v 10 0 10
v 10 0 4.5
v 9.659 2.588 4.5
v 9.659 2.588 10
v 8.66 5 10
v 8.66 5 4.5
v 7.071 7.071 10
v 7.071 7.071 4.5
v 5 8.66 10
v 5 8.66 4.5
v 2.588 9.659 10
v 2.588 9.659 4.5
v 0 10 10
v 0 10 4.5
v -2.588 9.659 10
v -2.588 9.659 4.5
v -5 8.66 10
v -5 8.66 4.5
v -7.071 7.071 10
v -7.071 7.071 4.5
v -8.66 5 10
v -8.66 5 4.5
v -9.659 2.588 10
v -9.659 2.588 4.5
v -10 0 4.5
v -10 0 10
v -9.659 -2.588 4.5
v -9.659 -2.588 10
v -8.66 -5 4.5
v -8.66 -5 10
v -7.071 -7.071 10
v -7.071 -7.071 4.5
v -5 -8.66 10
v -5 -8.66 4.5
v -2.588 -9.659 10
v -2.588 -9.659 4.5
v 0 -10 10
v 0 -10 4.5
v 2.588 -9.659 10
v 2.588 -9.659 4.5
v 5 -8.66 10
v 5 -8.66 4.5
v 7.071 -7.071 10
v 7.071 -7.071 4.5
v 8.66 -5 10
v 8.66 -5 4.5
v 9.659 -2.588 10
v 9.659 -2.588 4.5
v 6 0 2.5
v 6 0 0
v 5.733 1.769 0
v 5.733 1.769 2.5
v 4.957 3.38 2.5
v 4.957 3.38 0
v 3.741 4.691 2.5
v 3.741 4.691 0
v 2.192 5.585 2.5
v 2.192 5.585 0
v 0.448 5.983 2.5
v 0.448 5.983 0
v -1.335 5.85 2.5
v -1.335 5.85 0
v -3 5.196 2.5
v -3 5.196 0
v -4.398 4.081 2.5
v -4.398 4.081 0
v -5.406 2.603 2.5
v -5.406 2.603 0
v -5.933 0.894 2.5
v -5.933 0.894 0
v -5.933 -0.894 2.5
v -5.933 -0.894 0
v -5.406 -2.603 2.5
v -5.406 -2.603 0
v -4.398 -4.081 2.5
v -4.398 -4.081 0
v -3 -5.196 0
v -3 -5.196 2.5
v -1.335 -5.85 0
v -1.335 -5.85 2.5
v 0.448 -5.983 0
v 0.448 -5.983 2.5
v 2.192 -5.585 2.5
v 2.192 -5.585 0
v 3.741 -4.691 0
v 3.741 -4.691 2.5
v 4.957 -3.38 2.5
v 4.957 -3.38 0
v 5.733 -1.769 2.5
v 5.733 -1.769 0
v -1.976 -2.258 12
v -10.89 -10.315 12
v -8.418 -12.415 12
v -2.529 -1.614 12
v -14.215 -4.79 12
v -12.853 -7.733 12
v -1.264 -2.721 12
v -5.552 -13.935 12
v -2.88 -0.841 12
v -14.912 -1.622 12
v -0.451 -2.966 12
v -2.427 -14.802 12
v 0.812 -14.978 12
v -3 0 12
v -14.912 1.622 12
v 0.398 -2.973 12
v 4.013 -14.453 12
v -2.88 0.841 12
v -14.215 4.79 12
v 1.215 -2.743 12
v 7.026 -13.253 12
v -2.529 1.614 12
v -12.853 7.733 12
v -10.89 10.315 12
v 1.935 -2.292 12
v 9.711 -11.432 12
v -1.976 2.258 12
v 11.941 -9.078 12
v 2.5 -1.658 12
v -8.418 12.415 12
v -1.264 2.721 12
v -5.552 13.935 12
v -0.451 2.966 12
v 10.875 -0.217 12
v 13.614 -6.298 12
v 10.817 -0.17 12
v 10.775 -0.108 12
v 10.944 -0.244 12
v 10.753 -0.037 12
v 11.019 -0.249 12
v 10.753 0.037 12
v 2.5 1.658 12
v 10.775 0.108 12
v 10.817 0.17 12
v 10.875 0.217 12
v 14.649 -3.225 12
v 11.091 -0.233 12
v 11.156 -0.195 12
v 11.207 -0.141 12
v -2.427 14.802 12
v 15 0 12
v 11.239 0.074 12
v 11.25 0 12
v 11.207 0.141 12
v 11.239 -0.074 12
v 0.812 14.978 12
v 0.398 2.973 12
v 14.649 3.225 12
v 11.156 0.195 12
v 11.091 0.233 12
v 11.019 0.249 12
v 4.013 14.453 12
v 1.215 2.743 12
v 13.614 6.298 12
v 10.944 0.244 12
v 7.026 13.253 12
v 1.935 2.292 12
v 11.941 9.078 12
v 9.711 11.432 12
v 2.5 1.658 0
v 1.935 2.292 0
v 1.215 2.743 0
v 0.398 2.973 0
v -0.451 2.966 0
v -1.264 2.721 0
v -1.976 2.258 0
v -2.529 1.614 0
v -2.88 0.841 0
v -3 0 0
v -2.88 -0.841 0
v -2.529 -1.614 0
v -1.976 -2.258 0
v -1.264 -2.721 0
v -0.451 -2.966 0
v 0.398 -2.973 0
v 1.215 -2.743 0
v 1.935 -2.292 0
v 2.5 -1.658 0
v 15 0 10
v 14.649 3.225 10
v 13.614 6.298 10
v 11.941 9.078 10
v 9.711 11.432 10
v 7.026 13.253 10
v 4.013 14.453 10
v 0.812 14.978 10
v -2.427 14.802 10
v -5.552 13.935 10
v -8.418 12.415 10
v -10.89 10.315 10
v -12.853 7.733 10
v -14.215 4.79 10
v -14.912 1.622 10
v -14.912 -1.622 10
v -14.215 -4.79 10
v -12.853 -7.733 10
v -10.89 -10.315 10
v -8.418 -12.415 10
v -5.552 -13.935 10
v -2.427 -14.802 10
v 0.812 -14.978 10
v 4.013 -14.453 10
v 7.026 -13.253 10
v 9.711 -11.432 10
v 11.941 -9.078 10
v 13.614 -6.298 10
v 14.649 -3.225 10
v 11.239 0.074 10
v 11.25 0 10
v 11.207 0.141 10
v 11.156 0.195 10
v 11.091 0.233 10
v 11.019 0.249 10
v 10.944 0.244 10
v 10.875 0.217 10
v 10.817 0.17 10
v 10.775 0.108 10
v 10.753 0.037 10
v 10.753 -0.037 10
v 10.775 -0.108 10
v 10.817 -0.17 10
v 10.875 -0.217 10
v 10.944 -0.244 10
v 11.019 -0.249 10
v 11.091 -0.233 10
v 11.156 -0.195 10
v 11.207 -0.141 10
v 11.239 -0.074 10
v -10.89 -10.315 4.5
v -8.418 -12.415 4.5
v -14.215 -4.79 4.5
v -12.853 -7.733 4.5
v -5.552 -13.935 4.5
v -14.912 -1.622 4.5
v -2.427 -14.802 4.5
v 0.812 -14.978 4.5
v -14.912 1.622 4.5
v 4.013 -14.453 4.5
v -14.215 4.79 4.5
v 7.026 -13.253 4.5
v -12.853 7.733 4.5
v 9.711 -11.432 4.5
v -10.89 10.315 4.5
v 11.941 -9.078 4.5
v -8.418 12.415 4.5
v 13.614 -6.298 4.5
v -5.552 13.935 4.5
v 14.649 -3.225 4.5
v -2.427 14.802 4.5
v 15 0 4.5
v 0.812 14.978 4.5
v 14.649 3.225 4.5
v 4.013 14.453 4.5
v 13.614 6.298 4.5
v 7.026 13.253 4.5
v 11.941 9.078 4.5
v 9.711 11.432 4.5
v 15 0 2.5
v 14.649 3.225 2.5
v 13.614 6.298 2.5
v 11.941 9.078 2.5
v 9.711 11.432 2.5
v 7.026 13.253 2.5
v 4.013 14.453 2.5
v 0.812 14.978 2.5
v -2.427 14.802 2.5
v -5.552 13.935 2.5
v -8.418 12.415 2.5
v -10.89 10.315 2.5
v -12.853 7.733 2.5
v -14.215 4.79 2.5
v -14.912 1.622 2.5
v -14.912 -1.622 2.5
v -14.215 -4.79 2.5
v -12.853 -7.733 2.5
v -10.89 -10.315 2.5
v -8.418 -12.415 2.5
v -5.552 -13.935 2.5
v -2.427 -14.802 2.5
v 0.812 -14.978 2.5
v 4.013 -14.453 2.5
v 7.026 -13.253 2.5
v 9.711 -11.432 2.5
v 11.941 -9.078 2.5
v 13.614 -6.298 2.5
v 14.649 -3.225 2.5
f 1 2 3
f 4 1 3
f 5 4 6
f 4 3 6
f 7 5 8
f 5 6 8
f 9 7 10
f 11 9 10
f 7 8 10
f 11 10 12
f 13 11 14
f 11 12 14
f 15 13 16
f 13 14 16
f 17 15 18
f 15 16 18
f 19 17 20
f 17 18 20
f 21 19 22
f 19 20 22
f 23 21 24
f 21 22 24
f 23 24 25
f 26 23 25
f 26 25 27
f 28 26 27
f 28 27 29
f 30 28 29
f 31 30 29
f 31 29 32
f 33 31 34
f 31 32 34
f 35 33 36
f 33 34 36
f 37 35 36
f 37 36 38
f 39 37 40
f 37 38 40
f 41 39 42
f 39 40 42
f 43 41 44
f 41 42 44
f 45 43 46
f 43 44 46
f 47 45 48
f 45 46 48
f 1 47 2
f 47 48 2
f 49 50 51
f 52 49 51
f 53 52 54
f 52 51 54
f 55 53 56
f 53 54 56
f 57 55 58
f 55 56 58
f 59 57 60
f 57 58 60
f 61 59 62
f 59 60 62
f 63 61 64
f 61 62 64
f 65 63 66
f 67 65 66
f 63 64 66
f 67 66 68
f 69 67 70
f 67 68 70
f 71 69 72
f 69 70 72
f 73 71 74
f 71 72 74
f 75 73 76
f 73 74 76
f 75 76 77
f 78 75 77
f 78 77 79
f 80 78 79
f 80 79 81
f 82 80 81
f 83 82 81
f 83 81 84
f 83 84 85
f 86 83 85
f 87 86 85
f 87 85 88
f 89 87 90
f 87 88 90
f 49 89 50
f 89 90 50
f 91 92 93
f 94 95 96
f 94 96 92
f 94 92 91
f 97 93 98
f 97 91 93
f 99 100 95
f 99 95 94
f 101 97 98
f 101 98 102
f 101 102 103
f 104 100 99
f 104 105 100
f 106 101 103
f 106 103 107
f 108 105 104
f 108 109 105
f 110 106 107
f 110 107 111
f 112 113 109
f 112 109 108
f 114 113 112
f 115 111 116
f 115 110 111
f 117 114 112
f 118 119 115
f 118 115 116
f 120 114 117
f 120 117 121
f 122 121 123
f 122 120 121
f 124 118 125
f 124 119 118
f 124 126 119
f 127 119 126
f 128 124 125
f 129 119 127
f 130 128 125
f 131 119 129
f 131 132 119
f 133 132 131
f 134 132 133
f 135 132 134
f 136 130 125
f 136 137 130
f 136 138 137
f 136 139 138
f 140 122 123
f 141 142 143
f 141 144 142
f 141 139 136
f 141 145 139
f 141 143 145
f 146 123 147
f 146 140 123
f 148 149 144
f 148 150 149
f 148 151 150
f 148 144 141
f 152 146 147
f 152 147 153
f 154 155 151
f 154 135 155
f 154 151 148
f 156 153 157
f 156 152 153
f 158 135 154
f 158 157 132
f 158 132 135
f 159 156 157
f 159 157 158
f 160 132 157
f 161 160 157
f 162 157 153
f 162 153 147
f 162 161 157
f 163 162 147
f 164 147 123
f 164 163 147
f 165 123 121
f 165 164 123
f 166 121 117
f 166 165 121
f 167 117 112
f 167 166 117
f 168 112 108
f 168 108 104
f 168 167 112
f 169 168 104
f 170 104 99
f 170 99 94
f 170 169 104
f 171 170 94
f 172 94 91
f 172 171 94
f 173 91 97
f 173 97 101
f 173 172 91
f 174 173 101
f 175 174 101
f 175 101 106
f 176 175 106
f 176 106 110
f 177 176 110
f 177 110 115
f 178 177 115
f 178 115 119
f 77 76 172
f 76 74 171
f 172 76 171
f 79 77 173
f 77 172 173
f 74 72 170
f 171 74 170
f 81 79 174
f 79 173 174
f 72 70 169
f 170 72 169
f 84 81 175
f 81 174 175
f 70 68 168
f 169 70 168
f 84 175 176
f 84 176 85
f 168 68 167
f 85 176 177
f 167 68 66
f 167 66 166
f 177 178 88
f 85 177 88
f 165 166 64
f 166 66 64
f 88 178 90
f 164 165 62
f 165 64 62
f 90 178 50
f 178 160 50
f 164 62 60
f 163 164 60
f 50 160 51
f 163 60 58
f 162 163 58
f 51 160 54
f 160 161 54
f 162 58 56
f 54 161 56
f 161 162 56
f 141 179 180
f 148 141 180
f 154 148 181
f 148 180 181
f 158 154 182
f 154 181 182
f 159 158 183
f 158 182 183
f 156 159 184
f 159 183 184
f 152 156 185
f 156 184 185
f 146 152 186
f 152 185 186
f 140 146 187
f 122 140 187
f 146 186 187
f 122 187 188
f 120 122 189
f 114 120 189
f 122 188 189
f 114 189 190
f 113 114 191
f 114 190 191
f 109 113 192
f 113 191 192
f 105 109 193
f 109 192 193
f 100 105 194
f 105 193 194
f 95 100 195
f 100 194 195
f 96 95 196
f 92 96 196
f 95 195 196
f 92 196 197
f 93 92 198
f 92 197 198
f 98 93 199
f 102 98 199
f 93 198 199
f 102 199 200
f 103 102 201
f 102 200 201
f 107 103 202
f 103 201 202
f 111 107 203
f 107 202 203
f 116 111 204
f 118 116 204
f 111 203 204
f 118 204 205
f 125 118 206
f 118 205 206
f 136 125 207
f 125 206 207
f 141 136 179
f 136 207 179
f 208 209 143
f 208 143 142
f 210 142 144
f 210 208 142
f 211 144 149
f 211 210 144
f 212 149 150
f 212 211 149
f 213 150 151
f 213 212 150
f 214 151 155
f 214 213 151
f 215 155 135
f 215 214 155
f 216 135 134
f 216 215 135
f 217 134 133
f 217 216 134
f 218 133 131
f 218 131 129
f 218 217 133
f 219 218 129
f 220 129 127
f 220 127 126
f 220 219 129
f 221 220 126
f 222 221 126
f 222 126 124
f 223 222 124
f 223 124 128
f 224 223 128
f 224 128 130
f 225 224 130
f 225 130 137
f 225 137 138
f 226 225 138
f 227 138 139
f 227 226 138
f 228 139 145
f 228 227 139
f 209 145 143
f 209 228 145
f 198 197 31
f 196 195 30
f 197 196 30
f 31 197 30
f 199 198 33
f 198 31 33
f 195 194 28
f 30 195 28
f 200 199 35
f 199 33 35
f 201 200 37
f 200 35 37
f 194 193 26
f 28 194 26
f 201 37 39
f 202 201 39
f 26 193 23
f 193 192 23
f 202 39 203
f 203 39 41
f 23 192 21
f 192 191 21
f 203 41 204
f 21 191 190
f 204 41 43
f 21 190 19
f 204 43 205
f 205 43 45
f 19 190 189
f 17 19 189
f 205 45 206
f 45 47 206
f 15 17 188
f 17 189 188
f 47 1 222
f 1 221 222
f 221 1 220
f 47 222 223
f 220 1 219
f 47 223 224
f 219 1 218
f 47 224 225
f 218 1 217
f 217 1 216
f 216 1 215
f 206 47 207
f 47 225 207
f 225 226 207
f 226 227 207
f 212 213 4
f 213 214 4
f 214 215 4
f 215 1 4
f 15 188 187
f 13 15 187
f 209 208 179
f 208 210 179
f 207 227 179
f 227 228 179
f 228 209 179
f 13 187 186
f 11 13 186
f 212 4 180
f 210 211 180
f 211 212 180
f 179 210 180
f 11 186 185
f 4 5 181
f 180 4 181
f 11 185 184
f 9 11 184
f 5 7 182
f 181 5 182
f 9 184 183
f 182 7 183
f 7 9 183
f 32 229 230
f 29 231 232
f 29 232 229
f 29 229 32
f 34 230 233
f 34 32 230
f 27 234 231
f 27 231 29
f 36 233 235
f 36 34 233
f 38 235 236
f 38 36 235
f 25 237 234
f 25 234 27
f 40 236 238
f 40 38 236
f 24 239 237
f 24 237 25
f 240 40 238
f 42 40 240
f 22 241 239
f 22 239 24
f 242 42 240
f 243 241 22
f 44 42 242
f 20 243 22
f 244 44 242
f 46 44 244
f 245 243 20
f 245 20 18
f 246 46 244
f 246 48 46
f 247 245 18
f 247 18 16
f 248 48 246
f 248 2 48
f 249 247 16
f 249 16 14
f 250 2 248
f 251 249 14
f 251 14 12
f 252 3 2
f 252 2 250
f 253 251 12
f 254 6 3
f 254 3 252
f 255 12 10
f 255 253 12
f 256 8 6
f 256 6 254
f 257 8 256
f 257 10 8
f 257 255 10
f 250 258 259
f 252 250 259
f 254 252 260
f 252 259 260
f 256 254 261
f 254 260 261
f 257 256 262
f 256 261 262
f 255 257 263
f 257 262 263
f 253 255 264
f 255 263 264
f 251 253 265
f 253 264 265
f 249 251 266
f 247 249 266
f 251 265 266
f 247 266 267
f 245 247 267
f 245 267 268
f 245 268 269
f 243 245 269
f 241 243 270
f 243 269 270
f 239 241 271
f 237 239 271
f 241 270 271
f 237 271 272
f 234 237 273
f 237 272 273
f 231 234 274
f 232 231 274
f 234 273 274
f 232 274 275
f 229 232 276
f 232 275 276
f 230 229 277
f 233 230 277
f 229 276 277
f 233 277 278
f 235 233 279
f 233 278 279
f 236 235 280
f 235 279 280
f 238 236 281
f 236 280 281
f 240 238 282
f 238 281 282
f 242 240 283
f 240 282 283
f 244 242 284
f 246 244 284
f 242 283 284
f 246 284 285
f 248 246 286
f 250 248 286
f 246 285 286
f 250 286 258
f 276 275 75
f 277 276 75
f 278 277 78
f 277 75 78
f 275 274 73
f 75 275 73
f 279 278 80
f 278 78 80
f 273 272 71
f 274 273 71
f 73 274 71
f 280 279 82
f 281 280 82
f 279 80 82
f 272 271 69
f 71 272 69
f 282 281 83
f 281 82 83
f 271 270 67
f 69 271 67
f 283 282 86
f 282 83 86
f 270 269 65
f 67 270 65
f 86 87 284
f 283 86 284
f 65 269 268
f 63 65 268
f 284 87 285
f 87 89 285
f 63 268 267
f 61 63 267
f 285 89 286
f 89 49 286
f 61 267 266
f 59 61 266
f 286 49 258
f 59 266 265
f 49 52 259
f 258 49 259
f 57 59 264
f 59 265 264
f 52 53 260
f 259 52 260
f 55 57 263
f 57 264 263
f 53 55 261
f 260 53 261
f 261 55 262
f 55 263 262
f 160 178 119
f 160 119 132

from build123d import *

# Parameters (mm, degrees)
BOX_W             = 0.5
BOX_H             = 6
BOX_DEPTH         = 12
CYLINDER005_R     = 3
CYLINDER005_DEPTH = 12
CYLINDER002_R     = 15
CYLINDER002_DEPTH = 2
CYLINDER003_R     = 6
CYLINDER003_DEPTH = 2.5
CYLINDER004_R     = 0.25
CYLINDER004_DEPTH = 2
CYLINDER_R        = 15
CYLINDER_DEPTH    = 2
CYLINDER001_R     = 10
CYLINDER001_DEPTH = 5.5


with BuildPart() as shaftholeflat:
    # Box → Box (new body)
    with BuildSketch(Plane(origin=(2.5, -3, 0), x_dir=(1, 0, 0), z_dir=(0, 0, 1))):
        with Locations((0.25, 3)):
            Rectangle(BOX_W, BOX_H)
    extrude(amount=BOX_DEPTH)


with BuildPart() as shafthole:
    # Cylinder005 → Cylinder005 (new body)
    with BuildSketch(Plane.XY):
        Circle(CYLINDER005_R)
    extrude(amount=CYLINDER005_DEPTH)

    # Cut: cut ShaftHoleFlat
    add(shaftholeflat.part, mode=Mode.SUBTRACT)


with BuildPart() as bottom:
    # Cylinder002 → Cylinder002 (new body)
    with BuildSketch(Plane.XY.offset(2.5)):
        Circle(CYLINDER002_R)
    extrude(amount=CYLINDER002_DEPTH)


with BuildPart() as standoff:
    # Cylinder003 → Cylinder003 (new body)
    with BuildSketch(Plane.XY):
        Circle(CYLINDER003_R)
    extrude(amount=CYLINDER003_DEPTH)


with BuildPart() as wiretiehole:
    # Cylinder004 → Cylinder004 (new body)
    with BuildSketch(Plane(origin=(11, 0, 10), x_dir=(1, 0, 0), z_dir=(0, 0, 1))):
        Circle(CYLINDER004_R)
    extrude(amount=CYLINDER004_DEPTH)


with BuildPart() as topwithwiretiehole:
    # Cylinder → Cylinder (new body)
    with BuildSketch(Plane.XY.offset(10)):
        Circle(CYLINDER_R)
    extrude(amount=CYLINDER_DEPTH)

    # Cut001: cut WireTieHole
    add(wiretiehole.part, mode=Mode.SUBTRACT)


with BuildPart() as body:
    # Cylinder001 → Cylinder001 (new body)
    with BuildSketch(Plane.XY.offset(4.5)):
        Circle(CYLINDER001_R)
    extrude(amount=CYLINDER001_DEPTH)

    # Fusion: union Bottom, Standoff, TopWithWireTieHole
    add(bottom.part)
    add(standoff.part)
    add(topwithwiretiehole.part)

    # Cut002: cut ShaftHole
    add(shafthole.part, mode=Mode.SUBTRACT)


solid = body.part
